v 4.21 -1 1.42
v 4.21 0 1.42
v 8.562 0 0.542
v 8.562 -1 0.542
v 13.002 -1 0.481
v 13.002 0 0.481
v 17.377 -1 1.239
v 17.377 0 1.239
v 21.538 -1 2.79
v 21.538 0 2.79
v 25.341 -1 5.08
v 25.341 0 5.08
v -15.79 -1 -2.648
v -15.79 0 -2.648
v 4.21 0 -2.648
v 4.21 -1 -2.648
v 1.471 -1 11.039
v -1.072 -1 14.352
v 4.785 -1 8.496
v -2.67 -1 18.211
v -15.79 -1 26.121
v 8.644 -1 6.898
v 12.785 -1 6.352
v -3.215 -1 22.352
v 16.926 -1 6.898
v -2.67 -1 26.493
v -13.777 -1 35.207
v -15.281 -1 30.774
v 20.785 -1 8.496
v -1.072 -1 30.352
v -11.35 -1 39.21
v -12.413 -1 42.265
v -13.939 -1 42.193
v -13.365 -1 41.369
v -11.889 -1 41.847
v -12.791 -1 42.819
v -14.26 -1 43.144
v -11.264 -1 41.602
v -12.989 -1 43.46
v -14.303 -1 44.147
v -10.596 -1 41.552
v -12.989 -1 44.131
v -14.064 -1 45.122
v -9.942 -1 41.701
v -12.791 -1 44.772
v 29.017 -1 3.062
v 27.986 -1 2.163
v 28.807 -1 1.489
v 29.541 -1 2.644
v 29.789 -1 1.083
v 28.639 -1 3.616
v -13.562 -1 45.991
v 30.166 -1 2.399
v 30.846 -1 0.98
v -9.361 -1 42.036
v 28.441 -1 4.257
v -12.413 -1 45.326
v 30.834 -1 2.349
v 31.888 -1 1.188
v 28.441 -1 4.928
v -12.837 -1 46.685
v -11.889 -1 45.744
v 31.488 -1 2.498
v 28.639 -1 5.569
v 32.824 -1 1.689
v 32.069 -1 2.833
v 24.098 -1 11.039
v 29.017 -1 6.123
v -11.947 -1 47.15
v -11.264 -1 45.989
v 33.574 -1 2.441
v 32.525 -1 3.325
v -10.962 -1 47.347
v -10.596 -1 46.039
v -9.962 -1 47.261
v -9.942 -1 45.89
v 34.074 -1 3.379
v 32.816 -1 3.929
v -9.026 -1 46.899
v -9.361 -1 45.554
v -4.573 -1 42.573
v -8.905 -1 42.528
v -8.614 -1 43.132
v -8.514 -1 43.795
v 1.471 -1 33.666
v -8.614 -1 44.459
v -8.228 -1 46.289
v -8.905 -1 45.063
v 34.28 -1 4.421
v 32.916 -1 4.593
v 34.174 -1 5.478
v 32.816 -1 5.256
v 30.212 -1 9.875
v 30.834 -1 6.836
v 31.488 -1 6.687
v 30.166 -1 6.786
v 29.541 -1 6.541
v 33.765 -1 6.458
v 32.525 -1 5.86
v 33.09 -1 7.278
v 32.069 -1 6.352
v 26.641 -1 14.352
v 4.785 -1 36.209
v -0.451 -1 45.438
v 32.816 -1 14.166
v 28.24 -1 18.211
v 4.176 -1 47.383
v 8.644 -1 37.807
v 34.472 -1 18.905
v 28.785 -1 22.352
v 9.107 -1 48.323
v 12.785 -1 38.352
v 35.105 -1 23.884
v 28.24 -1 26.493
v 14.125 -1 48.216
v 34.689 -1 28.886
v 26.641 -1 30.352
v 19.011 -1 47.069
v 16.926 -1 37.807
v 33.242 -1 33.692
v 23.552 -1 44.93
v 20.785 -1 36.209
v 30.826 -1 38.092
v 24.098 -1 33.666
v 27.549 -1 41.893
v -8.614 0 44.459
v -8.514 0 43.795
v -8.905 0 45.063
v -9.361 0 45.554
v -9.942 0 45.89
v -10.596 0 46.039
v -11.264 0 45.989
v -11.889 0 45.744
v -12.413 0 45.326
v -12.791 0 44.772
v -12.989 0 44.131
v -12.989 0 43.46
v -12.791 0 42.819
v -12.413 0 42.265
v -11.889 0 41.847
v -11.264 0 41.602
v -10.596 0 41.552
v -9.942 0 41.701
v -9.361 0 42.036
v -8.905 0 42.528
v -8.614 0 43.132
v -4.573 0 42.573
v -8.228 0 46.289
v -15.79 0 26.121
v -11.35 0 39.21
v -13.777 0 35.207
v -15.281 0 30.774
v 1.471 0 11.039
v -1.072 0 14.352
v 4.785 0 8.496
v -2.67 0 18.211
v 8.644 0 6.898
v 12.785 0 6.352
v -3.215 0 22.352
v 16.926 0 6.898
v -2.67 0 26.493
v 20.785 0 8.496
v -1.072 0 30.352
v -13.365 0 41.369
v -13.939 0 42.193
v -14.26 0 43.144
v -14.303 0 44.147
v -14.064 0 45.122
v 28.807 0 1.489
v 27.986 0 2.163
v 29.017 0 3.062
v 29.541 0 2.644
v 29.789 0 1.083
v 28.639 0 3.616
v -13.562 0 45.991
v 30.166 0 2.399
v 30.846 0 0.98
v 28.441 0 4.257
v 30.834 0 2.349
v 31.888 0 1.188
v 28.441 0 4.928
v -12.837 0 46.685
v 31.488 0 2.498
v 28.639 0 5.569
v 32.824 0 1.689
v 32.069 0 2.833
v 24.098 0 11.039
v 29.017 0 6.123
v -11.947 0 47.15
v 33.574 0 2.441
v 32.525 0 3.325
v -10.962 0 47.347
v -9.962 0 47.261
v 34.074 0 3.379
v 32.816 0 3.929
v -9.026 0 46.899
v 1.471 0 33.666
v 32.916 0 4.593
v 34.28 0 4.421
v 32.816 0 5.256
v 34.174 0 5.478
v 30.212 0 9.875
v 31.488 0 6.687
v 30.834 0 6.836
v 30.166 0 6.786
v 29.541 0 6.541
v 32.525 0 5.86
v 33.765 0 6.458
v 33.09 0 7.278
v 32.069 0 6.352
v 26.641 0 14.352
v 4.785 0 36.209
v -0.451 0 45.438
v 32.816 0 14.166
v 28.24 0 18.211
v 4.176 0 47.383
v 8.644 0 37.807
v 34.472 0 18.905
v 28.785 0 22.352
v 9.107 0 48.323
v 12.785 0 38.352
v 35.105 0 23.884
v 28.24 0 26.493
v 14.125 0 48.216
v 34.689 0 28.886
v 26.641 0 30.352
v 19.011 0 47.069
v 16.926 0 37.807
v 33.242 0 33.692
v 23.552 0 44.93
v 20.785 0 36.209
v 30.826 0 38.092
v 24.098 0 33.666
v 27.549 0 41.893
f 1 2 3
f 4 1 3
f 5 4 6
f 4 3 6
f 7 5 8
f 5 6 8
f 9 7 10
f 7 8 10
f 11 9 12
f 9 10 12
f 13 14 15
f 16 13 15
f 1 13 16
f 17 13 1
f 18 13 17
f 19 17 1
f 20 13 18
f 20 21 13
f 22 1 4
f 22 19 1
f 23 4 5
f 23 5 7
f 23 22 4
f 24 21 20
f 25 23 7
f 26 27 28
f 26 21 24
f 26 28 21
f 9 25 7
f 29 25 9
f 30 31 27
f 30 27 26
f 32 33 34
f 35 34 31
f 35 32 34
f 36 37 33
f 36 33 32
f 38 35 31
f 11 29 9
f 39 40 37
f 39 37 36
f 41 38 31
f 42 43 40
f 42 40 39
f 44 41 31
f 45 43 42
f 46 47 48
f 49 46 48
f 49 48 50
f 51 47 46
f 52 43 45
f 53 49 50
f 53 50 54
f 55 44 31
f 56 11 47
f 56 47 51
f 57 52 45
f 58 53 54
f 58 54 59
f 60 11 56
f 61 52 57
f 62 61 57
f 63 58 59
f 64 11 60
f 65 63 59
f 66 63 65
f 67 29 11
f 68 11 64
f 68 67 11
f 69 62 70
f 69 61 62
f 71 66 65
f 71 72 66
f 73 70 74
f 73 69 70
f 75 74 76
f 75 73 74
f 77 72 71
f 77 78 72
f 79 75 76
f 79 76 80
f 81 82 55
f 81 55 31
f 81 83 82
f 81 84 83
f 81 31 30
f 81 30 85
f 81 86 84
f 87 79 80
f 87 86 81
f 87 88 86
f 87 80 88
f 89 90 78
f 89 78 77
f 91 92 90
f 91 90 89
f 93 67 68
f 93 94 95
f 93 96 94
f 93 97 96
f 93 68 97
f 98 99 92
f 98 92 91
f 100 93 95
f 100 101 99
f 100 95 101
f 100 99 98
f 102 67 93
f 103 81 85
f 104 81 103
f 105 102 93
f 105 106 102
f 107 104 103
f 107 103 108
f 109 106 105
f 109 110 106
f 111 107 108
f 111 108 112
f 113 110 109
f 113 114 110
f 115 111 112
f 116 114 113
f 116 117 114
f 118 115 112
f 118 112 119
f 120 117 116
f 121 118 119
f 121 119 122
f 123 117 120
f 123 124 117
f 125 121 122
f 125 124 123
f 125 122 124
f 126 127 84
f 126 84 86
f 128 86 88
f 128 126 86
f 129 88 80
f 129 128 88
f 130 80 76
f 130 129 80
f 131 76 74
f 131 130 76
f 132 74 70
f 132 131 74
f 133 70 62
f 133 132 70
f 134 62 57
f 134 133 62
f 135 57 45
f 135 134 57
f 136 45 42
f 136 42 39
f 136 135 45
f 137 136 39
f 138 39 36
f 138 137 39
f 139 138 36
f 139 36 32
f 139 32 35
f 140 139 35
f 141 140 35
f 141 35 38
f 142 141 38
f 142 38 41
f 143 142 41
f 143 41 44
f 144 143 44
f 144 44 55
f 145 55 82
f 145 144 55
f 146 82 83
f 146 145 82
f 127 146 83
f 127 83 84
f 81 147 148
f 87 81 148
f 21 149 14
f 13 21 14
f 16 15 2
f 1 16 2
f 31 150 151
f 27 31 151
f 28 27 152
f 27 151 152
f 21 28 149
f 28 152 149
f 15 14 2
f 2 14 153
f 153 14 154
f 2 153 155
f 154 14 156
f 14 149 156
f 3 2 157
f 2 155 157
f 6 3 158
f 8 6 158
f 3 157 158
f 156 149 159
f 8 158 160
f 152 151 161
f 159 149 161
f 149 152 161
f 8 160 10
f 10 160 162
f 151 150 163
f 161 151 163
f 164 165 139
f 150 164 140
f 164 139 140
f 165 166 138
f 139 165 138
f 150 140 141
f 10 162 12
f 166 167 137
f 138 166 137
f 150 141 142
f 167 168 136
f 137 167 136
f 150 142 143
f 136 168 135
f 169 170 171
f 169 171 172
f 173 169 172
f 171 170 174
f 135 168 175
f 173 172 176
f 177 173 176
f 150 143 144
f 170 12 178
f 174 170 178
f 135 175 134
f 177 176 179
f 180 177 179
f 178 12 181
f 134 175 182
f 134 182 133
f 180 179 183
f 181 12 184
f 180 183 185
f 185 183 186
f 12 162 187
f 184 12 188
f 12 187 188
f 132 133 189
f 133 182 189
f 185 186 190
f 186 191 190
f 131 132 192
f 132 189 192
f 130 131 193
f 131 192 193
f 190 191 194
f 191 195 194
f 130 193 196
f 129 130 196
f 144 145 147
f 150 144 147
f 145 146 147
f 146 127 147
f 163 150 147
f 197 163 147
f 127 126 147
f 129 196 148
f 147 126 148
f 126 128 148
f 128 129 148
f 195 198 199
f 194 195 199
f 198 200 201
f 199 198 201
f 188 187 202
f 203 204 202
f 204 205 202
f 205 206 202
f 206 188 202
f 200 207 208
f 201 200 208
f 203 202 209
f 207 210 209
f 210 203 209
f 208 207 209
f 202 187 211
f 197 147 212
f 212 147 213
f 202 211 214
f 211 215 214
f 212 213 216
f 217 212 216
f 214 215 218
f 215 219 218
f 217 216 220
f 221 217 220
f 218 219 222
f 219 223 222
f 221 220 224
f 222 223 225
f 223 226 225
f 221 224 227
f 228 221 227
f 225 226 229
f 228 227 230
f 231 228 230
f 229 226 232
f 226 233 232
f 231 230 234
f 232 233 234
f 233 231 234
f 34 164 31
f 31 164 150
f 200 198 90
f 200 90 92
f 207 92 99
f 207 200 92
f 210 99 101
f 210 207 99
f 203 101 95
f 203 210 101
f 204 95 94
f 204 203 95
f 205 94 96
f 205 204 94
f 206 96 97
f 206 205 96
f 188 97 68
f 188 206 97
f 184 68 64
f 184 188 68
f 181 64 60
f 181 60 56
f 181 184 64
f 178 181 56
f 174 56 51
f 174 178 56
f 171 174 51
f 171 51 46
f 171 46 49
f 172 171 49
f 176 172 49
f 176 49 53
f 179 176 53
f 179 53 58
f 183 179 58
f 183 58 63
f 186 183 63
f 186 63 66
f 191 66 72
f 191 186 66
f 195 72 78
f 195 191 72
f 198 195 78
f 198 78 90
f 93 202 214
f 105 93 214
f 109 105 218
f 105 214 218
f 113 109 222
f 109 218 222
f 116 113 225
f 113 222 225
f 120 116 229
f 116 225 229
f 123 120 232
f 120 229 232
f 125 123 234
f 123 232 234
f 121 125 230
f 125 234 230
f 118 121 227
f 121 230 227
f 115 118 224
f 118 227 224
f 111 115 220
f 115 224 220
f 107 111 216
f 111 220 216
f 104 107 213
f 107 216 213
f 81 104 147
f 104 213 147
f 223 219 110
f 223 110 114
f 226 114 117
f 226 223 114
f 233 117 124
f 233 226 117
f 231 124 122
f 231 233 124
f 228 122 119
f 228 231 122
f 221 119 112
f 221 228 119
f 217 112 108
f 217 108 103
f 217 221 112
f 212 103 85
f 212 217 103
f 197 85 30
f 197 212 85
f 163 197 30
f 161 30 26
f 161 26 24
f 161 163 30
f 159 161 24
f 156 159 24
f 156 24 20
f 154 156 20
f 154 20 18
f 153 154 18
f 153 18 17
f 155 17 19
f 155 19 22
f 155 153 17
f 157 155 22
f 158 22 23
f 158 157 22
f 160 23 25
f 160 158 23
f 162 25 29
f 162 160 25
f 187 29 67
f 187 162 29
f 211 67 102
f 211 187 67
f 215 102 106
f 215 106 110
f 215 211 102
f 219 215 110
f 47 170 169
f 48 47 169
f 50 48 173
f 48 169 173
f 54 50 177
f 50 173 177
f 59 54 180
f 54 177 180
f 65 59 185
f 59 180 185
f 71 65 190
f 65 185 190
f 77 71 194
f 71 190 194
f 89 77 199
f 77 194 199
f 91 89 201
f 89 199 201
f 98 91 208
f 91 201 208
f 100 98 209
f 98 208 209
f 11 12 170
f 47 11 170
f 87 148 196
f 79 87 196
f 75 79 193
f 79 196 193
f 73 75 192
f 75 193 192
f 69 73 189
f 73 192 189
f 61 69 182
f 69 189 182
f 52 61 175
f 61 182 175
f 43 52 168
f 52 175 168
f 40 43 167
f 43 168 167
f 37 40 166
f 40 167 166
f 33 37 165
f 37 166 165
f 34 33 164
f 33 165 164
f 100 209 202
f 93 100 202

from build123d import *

# Parameters (mm, degrees)
F0_R     = 2.25
F0_R_2   = 16
F1_DEPTH = 1


with BuildPart() as f1:
    # F0 (on Front) → F1 (new body)
    with BuildSketch(Plane.XZ):
        with BuildLine():
            Line((4.209625, -2.647812), (4.209625, 1.420013))
            ThreePointArc((4.209625, 1.420013), (15.207091, 0.758549), (25.341338, 5.080448))
            Line((25.341338, 5.080448), (27.98607, 2.162959))
            ThreePointArc((27.98607, 2.162959), (33.227056, 2.037489), (33.08977, 7.27818))
            Line((33.08977, 7.27818), (30.211789, 9.875299))
            ThreePointArc((30.211789, 9.875299), (27.548758, 41.893357), (-4.572665, 42.57308))
            Line((-4.572665, 42.57308), (-8.227887, 46.289463))
            ThreePointArc((-8.227887, 46.289463), (-13.224062, 46.363974), (-13.364673, 41.369222))
            Line((-13.364673, 41.369222), (-11.350405, 39.209819))
            ThreePointArc((-11.350405, 39.209819), (-14.650167, 33.0315), (-15.790375, 26.12064))
            Line((-15.790375, 26.12064), (-15.790375, -2.647812))
            Line((-15.790375, -2.647812), (4.209625, -2.647812))
        make_face()
        with Locations((30.666229, 4.592549)):
            Circle(F0_R, mode=Mode.SUBTRACT)
        with Locations((12.784705, 22.352362)):
            Circle(F0_R_2, mode=Mode.SUBTRACT)
        with Locations((-10.763726, 43.795356)):
            Circle(F0_R, mode=Mode.SUBTRACT)
    extrude(amount=F1_DEPTH)


solid = f1.part
